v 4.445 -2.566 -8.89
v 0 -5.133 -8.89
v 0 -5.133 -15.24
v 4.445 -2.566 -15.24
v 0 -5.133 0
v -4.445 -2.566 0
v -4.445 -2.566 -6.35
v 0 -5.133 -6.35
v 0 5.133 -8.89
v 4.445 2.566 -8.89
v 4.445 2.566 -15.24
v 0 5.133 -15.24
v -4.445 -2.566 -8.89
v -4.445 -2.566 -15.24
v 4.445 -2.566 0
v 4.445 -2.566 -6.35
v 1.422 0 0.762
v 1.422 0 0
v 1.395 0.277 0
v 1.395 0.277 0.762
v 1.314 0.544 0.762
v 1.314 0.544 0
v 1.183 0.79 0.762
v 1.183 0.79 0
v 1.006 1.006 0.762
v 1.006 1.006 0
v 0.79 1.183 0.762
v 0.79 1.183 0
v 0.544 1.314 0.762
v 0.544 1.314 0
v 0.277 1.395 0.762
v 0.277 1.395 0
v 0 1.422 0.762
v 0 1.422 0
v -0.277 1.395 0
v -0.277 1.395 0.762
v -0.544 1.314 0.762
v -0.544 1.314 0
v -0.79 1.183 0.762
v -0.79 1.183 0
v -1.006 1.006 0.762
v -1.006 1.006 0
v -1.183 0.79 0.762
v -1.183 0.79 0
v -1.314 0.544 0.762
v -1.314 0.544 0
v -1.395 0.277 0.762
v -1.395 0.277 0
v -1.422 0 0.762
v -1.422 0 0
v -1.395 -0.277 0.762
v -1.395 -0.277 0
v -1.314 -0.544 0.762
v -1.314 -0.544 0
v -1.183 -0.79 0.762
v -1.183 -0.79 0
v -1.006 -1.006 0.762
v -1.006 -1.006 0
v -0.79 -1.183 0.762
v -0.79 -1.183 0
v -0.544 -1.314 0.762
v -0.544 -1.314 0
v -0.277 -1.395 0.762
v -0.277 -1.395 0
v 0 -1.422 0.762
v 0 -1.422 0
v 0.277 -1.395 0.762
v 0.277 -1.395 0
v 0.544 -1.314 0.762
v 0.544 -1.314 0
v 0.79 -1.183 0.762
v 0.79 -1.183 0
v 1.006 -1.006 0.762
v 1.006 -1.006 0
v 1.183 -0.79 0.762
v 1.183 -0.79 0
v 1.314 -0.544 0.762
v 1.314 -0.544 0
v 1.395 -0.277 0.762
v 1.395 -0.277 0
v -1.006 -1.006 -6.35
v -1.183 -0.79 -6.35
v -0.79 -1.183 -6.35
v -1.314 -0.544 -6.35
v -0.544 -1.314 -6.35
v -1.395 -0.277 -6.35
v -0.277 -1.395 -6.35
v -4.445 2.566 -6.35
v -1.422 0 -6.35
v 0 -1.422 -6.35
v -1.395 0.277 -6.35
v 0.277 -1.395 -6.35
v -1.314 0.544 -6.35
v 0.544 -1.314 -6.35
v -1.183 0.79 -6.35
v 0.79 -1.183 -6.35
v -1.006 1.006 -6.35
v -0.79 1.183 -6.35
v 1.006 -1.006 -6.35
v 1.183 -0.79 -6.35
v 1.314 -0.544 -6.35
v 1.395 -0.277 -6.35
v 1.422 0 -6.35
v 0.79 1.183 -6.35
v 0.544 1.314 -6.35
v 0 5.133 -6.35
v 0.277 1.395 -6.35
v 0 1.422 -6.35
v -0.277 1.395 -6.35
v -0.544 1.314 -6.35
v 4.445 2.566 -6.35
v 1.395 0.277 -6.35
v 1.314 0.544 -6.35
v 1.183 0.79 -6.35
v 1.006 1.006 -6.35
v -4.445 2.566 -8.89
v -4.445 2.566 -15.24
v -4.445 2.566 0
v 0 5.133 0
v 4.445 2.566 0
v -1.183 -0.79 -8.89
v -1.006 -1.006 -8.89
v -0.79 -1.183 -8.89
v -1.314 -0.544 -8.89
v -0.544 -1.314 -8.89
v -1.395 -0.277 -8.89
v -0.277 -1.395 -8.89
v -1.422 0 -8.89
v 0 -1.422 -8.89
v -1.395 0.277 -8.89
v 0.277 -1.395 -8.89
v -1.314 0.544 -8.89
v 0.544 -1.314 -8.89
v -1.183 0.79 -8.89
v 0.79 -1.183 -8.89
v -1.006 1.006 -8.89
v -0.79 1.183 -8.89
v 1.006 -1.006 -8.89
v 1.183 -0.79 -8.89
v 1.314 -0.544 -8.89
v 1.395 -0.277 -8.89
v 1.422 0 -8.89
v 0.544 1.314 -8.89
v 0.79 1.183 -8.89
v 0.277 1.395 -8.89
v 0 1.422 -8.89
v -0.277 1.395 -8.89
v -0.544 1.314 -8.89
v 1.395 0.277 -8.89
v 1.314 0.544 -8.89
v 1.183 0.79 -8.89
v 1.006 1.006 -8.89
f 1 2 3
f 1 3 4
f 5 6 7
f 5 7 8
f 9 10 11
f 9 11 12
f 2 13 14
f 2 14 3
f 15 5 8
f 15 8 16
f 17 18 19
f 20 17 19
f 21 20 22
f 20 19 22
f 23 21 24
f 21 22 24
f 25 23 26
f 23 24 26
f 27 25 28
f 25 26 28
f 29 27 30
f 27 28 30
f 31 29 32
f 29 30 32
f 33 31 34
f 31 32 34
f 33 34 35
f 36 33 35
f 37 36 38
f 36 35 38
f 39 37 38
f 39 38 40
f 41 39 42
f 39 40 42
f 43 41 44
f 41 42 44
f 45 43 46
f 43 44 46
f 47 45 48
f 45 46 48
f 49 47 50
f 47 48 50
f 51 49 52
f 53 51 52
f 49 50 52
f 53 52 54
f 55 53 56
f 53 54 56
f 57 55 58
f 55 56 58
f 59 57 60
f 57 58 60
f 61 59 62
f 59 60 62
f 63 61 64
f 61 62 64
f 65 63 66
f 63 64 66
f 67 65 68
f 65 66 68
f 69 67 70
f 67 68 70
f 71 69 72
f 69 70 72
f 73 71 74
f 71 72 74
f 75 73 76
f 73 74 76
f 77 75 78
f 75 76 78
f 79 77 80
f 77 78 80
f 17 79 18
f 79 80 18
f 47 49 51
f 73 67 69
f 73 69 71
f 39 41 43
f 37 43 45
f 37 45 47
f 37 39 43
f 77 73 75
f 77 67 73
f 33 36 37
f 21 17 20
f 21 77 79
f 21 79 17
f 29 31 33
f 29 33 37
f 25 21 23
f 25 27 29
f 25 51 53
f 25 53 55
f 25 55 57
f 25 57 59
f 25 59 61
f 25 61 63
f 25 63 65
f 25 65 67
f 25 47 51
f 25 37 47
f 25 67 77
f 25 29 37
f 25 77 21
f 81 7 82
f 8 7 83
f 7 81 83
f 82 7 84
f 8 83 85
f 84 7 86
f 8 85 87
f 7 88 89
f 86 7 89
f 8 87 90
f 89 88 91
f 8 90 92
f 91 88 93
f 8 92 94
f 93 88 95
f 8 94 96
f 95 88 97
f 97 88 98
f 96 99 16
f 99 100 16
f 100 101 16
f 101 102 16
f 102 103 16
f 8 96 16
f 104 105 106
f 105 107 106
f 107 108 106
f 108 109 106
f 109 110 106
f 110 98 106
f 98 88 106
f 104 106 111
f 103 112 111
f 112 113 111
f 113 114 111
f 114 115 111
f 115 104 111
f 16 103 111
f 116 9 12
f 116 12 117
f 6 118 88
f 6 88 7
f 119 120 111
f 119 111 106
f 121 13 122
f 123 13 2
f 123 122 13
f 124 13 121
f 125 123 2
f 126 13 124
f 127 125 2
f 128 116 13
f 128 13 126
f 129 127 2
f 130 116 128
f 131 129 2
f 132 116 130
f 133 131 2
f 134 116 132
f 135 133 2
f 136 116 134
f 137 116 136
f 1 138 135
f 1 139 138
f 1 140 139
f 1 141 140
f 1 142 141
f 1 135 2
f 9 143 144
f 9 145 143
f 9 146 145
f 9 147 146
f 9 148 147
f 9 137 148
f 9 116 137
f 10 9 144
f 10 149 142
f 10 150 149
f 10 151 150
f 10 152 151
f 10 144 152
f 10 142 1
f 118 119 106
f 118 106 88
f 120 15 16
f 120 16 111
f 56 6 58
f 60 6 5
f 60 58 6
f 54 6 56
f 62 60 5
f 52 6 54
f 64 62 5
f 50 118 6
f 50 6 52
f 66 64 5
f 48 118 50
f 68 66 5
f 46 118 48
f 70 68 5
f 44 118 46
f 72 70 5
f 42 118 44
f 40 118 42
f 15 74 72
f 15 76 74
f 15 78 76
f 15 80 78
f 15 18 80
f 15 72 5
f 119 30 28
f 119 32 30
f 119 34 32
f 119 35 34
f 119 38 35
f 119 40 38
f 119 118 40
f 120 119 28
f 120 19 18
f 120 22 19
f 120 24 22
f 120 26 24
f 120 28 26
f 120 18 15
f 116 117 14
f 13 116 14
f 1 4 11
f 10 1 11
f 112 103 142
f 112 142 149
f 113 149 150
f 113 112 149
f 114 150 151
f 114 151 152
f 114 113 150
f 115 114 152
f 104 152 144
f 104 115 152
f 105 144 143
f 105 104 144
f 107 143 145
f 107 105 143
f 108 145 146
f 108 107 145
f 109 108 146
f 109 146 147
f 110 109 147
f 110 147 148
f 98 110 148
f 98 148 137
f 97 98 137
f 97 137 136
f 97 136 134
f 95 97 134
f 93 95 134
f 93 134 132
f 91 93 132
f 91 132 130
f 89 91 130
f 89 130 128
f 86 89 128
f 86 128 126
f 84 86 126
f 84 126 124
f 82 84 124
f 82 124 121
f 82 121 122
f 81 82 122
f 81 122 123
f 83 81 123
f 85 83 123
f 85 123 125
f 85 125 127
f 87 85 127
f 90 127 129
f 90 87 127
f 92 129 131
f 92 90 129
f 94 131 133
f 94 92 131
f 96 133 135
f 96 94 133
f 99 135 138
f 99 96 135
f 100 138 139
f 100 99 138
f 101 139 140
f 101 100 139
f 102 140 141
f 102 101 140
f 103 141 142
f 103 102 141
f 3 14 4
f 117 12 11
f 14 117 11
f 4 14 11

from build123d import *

# Parameters (mm, degrees)
F0_R          = 1.4221963341
F1_DEPTH      = 6.35
F2_DEPTH      = 0.762
F2_DEPTH_BACK = 15.24
F3_START      = -8.89
F3_DEPTH      = 6.35


with BuildPart() as f1:
    # F0 (on Top) → F1 (new body)
    with BuildSketch(Plane.XY):
        Polygon((4.445, -2.5663219465), (4.445, 2.5663219465), (0, 5.1326438931), (-4.445, 2.5663219465), (-4.445, -2.5663219465), (0, -5.1326438931), align=None)
        Circle(F0_R, mode=Mode.SUBTRACT)
    extrude(amount=-F1_DEPTH)

    # F0 (on Top) → F2 (join, two sides)
    with BuildSketch(Plane.XY) as f2_sk:
        Circle(F0_R)
    extrude(amount=F2_DEPTH)
    extrude(f2_sk.sketch, amount=-F2_DEPTH_BACK)

    # F0 (on Top) → F3 (join)
    with BuildSketch(Plane.XY.offset(F3_START)):
        Polygon((4.445, -2.5663219465), (4.445, 2.5663219465), (0, 5.1326438931), (-4.445, 2.5663219465), (-4.445, -2.5663219465), (0, -5.1326438931), align=None)
        Circle(F0_R, mode=Mode.SUBTRACT)
    extrude(amount=-F3_DEPTH)


solid = f1.part
